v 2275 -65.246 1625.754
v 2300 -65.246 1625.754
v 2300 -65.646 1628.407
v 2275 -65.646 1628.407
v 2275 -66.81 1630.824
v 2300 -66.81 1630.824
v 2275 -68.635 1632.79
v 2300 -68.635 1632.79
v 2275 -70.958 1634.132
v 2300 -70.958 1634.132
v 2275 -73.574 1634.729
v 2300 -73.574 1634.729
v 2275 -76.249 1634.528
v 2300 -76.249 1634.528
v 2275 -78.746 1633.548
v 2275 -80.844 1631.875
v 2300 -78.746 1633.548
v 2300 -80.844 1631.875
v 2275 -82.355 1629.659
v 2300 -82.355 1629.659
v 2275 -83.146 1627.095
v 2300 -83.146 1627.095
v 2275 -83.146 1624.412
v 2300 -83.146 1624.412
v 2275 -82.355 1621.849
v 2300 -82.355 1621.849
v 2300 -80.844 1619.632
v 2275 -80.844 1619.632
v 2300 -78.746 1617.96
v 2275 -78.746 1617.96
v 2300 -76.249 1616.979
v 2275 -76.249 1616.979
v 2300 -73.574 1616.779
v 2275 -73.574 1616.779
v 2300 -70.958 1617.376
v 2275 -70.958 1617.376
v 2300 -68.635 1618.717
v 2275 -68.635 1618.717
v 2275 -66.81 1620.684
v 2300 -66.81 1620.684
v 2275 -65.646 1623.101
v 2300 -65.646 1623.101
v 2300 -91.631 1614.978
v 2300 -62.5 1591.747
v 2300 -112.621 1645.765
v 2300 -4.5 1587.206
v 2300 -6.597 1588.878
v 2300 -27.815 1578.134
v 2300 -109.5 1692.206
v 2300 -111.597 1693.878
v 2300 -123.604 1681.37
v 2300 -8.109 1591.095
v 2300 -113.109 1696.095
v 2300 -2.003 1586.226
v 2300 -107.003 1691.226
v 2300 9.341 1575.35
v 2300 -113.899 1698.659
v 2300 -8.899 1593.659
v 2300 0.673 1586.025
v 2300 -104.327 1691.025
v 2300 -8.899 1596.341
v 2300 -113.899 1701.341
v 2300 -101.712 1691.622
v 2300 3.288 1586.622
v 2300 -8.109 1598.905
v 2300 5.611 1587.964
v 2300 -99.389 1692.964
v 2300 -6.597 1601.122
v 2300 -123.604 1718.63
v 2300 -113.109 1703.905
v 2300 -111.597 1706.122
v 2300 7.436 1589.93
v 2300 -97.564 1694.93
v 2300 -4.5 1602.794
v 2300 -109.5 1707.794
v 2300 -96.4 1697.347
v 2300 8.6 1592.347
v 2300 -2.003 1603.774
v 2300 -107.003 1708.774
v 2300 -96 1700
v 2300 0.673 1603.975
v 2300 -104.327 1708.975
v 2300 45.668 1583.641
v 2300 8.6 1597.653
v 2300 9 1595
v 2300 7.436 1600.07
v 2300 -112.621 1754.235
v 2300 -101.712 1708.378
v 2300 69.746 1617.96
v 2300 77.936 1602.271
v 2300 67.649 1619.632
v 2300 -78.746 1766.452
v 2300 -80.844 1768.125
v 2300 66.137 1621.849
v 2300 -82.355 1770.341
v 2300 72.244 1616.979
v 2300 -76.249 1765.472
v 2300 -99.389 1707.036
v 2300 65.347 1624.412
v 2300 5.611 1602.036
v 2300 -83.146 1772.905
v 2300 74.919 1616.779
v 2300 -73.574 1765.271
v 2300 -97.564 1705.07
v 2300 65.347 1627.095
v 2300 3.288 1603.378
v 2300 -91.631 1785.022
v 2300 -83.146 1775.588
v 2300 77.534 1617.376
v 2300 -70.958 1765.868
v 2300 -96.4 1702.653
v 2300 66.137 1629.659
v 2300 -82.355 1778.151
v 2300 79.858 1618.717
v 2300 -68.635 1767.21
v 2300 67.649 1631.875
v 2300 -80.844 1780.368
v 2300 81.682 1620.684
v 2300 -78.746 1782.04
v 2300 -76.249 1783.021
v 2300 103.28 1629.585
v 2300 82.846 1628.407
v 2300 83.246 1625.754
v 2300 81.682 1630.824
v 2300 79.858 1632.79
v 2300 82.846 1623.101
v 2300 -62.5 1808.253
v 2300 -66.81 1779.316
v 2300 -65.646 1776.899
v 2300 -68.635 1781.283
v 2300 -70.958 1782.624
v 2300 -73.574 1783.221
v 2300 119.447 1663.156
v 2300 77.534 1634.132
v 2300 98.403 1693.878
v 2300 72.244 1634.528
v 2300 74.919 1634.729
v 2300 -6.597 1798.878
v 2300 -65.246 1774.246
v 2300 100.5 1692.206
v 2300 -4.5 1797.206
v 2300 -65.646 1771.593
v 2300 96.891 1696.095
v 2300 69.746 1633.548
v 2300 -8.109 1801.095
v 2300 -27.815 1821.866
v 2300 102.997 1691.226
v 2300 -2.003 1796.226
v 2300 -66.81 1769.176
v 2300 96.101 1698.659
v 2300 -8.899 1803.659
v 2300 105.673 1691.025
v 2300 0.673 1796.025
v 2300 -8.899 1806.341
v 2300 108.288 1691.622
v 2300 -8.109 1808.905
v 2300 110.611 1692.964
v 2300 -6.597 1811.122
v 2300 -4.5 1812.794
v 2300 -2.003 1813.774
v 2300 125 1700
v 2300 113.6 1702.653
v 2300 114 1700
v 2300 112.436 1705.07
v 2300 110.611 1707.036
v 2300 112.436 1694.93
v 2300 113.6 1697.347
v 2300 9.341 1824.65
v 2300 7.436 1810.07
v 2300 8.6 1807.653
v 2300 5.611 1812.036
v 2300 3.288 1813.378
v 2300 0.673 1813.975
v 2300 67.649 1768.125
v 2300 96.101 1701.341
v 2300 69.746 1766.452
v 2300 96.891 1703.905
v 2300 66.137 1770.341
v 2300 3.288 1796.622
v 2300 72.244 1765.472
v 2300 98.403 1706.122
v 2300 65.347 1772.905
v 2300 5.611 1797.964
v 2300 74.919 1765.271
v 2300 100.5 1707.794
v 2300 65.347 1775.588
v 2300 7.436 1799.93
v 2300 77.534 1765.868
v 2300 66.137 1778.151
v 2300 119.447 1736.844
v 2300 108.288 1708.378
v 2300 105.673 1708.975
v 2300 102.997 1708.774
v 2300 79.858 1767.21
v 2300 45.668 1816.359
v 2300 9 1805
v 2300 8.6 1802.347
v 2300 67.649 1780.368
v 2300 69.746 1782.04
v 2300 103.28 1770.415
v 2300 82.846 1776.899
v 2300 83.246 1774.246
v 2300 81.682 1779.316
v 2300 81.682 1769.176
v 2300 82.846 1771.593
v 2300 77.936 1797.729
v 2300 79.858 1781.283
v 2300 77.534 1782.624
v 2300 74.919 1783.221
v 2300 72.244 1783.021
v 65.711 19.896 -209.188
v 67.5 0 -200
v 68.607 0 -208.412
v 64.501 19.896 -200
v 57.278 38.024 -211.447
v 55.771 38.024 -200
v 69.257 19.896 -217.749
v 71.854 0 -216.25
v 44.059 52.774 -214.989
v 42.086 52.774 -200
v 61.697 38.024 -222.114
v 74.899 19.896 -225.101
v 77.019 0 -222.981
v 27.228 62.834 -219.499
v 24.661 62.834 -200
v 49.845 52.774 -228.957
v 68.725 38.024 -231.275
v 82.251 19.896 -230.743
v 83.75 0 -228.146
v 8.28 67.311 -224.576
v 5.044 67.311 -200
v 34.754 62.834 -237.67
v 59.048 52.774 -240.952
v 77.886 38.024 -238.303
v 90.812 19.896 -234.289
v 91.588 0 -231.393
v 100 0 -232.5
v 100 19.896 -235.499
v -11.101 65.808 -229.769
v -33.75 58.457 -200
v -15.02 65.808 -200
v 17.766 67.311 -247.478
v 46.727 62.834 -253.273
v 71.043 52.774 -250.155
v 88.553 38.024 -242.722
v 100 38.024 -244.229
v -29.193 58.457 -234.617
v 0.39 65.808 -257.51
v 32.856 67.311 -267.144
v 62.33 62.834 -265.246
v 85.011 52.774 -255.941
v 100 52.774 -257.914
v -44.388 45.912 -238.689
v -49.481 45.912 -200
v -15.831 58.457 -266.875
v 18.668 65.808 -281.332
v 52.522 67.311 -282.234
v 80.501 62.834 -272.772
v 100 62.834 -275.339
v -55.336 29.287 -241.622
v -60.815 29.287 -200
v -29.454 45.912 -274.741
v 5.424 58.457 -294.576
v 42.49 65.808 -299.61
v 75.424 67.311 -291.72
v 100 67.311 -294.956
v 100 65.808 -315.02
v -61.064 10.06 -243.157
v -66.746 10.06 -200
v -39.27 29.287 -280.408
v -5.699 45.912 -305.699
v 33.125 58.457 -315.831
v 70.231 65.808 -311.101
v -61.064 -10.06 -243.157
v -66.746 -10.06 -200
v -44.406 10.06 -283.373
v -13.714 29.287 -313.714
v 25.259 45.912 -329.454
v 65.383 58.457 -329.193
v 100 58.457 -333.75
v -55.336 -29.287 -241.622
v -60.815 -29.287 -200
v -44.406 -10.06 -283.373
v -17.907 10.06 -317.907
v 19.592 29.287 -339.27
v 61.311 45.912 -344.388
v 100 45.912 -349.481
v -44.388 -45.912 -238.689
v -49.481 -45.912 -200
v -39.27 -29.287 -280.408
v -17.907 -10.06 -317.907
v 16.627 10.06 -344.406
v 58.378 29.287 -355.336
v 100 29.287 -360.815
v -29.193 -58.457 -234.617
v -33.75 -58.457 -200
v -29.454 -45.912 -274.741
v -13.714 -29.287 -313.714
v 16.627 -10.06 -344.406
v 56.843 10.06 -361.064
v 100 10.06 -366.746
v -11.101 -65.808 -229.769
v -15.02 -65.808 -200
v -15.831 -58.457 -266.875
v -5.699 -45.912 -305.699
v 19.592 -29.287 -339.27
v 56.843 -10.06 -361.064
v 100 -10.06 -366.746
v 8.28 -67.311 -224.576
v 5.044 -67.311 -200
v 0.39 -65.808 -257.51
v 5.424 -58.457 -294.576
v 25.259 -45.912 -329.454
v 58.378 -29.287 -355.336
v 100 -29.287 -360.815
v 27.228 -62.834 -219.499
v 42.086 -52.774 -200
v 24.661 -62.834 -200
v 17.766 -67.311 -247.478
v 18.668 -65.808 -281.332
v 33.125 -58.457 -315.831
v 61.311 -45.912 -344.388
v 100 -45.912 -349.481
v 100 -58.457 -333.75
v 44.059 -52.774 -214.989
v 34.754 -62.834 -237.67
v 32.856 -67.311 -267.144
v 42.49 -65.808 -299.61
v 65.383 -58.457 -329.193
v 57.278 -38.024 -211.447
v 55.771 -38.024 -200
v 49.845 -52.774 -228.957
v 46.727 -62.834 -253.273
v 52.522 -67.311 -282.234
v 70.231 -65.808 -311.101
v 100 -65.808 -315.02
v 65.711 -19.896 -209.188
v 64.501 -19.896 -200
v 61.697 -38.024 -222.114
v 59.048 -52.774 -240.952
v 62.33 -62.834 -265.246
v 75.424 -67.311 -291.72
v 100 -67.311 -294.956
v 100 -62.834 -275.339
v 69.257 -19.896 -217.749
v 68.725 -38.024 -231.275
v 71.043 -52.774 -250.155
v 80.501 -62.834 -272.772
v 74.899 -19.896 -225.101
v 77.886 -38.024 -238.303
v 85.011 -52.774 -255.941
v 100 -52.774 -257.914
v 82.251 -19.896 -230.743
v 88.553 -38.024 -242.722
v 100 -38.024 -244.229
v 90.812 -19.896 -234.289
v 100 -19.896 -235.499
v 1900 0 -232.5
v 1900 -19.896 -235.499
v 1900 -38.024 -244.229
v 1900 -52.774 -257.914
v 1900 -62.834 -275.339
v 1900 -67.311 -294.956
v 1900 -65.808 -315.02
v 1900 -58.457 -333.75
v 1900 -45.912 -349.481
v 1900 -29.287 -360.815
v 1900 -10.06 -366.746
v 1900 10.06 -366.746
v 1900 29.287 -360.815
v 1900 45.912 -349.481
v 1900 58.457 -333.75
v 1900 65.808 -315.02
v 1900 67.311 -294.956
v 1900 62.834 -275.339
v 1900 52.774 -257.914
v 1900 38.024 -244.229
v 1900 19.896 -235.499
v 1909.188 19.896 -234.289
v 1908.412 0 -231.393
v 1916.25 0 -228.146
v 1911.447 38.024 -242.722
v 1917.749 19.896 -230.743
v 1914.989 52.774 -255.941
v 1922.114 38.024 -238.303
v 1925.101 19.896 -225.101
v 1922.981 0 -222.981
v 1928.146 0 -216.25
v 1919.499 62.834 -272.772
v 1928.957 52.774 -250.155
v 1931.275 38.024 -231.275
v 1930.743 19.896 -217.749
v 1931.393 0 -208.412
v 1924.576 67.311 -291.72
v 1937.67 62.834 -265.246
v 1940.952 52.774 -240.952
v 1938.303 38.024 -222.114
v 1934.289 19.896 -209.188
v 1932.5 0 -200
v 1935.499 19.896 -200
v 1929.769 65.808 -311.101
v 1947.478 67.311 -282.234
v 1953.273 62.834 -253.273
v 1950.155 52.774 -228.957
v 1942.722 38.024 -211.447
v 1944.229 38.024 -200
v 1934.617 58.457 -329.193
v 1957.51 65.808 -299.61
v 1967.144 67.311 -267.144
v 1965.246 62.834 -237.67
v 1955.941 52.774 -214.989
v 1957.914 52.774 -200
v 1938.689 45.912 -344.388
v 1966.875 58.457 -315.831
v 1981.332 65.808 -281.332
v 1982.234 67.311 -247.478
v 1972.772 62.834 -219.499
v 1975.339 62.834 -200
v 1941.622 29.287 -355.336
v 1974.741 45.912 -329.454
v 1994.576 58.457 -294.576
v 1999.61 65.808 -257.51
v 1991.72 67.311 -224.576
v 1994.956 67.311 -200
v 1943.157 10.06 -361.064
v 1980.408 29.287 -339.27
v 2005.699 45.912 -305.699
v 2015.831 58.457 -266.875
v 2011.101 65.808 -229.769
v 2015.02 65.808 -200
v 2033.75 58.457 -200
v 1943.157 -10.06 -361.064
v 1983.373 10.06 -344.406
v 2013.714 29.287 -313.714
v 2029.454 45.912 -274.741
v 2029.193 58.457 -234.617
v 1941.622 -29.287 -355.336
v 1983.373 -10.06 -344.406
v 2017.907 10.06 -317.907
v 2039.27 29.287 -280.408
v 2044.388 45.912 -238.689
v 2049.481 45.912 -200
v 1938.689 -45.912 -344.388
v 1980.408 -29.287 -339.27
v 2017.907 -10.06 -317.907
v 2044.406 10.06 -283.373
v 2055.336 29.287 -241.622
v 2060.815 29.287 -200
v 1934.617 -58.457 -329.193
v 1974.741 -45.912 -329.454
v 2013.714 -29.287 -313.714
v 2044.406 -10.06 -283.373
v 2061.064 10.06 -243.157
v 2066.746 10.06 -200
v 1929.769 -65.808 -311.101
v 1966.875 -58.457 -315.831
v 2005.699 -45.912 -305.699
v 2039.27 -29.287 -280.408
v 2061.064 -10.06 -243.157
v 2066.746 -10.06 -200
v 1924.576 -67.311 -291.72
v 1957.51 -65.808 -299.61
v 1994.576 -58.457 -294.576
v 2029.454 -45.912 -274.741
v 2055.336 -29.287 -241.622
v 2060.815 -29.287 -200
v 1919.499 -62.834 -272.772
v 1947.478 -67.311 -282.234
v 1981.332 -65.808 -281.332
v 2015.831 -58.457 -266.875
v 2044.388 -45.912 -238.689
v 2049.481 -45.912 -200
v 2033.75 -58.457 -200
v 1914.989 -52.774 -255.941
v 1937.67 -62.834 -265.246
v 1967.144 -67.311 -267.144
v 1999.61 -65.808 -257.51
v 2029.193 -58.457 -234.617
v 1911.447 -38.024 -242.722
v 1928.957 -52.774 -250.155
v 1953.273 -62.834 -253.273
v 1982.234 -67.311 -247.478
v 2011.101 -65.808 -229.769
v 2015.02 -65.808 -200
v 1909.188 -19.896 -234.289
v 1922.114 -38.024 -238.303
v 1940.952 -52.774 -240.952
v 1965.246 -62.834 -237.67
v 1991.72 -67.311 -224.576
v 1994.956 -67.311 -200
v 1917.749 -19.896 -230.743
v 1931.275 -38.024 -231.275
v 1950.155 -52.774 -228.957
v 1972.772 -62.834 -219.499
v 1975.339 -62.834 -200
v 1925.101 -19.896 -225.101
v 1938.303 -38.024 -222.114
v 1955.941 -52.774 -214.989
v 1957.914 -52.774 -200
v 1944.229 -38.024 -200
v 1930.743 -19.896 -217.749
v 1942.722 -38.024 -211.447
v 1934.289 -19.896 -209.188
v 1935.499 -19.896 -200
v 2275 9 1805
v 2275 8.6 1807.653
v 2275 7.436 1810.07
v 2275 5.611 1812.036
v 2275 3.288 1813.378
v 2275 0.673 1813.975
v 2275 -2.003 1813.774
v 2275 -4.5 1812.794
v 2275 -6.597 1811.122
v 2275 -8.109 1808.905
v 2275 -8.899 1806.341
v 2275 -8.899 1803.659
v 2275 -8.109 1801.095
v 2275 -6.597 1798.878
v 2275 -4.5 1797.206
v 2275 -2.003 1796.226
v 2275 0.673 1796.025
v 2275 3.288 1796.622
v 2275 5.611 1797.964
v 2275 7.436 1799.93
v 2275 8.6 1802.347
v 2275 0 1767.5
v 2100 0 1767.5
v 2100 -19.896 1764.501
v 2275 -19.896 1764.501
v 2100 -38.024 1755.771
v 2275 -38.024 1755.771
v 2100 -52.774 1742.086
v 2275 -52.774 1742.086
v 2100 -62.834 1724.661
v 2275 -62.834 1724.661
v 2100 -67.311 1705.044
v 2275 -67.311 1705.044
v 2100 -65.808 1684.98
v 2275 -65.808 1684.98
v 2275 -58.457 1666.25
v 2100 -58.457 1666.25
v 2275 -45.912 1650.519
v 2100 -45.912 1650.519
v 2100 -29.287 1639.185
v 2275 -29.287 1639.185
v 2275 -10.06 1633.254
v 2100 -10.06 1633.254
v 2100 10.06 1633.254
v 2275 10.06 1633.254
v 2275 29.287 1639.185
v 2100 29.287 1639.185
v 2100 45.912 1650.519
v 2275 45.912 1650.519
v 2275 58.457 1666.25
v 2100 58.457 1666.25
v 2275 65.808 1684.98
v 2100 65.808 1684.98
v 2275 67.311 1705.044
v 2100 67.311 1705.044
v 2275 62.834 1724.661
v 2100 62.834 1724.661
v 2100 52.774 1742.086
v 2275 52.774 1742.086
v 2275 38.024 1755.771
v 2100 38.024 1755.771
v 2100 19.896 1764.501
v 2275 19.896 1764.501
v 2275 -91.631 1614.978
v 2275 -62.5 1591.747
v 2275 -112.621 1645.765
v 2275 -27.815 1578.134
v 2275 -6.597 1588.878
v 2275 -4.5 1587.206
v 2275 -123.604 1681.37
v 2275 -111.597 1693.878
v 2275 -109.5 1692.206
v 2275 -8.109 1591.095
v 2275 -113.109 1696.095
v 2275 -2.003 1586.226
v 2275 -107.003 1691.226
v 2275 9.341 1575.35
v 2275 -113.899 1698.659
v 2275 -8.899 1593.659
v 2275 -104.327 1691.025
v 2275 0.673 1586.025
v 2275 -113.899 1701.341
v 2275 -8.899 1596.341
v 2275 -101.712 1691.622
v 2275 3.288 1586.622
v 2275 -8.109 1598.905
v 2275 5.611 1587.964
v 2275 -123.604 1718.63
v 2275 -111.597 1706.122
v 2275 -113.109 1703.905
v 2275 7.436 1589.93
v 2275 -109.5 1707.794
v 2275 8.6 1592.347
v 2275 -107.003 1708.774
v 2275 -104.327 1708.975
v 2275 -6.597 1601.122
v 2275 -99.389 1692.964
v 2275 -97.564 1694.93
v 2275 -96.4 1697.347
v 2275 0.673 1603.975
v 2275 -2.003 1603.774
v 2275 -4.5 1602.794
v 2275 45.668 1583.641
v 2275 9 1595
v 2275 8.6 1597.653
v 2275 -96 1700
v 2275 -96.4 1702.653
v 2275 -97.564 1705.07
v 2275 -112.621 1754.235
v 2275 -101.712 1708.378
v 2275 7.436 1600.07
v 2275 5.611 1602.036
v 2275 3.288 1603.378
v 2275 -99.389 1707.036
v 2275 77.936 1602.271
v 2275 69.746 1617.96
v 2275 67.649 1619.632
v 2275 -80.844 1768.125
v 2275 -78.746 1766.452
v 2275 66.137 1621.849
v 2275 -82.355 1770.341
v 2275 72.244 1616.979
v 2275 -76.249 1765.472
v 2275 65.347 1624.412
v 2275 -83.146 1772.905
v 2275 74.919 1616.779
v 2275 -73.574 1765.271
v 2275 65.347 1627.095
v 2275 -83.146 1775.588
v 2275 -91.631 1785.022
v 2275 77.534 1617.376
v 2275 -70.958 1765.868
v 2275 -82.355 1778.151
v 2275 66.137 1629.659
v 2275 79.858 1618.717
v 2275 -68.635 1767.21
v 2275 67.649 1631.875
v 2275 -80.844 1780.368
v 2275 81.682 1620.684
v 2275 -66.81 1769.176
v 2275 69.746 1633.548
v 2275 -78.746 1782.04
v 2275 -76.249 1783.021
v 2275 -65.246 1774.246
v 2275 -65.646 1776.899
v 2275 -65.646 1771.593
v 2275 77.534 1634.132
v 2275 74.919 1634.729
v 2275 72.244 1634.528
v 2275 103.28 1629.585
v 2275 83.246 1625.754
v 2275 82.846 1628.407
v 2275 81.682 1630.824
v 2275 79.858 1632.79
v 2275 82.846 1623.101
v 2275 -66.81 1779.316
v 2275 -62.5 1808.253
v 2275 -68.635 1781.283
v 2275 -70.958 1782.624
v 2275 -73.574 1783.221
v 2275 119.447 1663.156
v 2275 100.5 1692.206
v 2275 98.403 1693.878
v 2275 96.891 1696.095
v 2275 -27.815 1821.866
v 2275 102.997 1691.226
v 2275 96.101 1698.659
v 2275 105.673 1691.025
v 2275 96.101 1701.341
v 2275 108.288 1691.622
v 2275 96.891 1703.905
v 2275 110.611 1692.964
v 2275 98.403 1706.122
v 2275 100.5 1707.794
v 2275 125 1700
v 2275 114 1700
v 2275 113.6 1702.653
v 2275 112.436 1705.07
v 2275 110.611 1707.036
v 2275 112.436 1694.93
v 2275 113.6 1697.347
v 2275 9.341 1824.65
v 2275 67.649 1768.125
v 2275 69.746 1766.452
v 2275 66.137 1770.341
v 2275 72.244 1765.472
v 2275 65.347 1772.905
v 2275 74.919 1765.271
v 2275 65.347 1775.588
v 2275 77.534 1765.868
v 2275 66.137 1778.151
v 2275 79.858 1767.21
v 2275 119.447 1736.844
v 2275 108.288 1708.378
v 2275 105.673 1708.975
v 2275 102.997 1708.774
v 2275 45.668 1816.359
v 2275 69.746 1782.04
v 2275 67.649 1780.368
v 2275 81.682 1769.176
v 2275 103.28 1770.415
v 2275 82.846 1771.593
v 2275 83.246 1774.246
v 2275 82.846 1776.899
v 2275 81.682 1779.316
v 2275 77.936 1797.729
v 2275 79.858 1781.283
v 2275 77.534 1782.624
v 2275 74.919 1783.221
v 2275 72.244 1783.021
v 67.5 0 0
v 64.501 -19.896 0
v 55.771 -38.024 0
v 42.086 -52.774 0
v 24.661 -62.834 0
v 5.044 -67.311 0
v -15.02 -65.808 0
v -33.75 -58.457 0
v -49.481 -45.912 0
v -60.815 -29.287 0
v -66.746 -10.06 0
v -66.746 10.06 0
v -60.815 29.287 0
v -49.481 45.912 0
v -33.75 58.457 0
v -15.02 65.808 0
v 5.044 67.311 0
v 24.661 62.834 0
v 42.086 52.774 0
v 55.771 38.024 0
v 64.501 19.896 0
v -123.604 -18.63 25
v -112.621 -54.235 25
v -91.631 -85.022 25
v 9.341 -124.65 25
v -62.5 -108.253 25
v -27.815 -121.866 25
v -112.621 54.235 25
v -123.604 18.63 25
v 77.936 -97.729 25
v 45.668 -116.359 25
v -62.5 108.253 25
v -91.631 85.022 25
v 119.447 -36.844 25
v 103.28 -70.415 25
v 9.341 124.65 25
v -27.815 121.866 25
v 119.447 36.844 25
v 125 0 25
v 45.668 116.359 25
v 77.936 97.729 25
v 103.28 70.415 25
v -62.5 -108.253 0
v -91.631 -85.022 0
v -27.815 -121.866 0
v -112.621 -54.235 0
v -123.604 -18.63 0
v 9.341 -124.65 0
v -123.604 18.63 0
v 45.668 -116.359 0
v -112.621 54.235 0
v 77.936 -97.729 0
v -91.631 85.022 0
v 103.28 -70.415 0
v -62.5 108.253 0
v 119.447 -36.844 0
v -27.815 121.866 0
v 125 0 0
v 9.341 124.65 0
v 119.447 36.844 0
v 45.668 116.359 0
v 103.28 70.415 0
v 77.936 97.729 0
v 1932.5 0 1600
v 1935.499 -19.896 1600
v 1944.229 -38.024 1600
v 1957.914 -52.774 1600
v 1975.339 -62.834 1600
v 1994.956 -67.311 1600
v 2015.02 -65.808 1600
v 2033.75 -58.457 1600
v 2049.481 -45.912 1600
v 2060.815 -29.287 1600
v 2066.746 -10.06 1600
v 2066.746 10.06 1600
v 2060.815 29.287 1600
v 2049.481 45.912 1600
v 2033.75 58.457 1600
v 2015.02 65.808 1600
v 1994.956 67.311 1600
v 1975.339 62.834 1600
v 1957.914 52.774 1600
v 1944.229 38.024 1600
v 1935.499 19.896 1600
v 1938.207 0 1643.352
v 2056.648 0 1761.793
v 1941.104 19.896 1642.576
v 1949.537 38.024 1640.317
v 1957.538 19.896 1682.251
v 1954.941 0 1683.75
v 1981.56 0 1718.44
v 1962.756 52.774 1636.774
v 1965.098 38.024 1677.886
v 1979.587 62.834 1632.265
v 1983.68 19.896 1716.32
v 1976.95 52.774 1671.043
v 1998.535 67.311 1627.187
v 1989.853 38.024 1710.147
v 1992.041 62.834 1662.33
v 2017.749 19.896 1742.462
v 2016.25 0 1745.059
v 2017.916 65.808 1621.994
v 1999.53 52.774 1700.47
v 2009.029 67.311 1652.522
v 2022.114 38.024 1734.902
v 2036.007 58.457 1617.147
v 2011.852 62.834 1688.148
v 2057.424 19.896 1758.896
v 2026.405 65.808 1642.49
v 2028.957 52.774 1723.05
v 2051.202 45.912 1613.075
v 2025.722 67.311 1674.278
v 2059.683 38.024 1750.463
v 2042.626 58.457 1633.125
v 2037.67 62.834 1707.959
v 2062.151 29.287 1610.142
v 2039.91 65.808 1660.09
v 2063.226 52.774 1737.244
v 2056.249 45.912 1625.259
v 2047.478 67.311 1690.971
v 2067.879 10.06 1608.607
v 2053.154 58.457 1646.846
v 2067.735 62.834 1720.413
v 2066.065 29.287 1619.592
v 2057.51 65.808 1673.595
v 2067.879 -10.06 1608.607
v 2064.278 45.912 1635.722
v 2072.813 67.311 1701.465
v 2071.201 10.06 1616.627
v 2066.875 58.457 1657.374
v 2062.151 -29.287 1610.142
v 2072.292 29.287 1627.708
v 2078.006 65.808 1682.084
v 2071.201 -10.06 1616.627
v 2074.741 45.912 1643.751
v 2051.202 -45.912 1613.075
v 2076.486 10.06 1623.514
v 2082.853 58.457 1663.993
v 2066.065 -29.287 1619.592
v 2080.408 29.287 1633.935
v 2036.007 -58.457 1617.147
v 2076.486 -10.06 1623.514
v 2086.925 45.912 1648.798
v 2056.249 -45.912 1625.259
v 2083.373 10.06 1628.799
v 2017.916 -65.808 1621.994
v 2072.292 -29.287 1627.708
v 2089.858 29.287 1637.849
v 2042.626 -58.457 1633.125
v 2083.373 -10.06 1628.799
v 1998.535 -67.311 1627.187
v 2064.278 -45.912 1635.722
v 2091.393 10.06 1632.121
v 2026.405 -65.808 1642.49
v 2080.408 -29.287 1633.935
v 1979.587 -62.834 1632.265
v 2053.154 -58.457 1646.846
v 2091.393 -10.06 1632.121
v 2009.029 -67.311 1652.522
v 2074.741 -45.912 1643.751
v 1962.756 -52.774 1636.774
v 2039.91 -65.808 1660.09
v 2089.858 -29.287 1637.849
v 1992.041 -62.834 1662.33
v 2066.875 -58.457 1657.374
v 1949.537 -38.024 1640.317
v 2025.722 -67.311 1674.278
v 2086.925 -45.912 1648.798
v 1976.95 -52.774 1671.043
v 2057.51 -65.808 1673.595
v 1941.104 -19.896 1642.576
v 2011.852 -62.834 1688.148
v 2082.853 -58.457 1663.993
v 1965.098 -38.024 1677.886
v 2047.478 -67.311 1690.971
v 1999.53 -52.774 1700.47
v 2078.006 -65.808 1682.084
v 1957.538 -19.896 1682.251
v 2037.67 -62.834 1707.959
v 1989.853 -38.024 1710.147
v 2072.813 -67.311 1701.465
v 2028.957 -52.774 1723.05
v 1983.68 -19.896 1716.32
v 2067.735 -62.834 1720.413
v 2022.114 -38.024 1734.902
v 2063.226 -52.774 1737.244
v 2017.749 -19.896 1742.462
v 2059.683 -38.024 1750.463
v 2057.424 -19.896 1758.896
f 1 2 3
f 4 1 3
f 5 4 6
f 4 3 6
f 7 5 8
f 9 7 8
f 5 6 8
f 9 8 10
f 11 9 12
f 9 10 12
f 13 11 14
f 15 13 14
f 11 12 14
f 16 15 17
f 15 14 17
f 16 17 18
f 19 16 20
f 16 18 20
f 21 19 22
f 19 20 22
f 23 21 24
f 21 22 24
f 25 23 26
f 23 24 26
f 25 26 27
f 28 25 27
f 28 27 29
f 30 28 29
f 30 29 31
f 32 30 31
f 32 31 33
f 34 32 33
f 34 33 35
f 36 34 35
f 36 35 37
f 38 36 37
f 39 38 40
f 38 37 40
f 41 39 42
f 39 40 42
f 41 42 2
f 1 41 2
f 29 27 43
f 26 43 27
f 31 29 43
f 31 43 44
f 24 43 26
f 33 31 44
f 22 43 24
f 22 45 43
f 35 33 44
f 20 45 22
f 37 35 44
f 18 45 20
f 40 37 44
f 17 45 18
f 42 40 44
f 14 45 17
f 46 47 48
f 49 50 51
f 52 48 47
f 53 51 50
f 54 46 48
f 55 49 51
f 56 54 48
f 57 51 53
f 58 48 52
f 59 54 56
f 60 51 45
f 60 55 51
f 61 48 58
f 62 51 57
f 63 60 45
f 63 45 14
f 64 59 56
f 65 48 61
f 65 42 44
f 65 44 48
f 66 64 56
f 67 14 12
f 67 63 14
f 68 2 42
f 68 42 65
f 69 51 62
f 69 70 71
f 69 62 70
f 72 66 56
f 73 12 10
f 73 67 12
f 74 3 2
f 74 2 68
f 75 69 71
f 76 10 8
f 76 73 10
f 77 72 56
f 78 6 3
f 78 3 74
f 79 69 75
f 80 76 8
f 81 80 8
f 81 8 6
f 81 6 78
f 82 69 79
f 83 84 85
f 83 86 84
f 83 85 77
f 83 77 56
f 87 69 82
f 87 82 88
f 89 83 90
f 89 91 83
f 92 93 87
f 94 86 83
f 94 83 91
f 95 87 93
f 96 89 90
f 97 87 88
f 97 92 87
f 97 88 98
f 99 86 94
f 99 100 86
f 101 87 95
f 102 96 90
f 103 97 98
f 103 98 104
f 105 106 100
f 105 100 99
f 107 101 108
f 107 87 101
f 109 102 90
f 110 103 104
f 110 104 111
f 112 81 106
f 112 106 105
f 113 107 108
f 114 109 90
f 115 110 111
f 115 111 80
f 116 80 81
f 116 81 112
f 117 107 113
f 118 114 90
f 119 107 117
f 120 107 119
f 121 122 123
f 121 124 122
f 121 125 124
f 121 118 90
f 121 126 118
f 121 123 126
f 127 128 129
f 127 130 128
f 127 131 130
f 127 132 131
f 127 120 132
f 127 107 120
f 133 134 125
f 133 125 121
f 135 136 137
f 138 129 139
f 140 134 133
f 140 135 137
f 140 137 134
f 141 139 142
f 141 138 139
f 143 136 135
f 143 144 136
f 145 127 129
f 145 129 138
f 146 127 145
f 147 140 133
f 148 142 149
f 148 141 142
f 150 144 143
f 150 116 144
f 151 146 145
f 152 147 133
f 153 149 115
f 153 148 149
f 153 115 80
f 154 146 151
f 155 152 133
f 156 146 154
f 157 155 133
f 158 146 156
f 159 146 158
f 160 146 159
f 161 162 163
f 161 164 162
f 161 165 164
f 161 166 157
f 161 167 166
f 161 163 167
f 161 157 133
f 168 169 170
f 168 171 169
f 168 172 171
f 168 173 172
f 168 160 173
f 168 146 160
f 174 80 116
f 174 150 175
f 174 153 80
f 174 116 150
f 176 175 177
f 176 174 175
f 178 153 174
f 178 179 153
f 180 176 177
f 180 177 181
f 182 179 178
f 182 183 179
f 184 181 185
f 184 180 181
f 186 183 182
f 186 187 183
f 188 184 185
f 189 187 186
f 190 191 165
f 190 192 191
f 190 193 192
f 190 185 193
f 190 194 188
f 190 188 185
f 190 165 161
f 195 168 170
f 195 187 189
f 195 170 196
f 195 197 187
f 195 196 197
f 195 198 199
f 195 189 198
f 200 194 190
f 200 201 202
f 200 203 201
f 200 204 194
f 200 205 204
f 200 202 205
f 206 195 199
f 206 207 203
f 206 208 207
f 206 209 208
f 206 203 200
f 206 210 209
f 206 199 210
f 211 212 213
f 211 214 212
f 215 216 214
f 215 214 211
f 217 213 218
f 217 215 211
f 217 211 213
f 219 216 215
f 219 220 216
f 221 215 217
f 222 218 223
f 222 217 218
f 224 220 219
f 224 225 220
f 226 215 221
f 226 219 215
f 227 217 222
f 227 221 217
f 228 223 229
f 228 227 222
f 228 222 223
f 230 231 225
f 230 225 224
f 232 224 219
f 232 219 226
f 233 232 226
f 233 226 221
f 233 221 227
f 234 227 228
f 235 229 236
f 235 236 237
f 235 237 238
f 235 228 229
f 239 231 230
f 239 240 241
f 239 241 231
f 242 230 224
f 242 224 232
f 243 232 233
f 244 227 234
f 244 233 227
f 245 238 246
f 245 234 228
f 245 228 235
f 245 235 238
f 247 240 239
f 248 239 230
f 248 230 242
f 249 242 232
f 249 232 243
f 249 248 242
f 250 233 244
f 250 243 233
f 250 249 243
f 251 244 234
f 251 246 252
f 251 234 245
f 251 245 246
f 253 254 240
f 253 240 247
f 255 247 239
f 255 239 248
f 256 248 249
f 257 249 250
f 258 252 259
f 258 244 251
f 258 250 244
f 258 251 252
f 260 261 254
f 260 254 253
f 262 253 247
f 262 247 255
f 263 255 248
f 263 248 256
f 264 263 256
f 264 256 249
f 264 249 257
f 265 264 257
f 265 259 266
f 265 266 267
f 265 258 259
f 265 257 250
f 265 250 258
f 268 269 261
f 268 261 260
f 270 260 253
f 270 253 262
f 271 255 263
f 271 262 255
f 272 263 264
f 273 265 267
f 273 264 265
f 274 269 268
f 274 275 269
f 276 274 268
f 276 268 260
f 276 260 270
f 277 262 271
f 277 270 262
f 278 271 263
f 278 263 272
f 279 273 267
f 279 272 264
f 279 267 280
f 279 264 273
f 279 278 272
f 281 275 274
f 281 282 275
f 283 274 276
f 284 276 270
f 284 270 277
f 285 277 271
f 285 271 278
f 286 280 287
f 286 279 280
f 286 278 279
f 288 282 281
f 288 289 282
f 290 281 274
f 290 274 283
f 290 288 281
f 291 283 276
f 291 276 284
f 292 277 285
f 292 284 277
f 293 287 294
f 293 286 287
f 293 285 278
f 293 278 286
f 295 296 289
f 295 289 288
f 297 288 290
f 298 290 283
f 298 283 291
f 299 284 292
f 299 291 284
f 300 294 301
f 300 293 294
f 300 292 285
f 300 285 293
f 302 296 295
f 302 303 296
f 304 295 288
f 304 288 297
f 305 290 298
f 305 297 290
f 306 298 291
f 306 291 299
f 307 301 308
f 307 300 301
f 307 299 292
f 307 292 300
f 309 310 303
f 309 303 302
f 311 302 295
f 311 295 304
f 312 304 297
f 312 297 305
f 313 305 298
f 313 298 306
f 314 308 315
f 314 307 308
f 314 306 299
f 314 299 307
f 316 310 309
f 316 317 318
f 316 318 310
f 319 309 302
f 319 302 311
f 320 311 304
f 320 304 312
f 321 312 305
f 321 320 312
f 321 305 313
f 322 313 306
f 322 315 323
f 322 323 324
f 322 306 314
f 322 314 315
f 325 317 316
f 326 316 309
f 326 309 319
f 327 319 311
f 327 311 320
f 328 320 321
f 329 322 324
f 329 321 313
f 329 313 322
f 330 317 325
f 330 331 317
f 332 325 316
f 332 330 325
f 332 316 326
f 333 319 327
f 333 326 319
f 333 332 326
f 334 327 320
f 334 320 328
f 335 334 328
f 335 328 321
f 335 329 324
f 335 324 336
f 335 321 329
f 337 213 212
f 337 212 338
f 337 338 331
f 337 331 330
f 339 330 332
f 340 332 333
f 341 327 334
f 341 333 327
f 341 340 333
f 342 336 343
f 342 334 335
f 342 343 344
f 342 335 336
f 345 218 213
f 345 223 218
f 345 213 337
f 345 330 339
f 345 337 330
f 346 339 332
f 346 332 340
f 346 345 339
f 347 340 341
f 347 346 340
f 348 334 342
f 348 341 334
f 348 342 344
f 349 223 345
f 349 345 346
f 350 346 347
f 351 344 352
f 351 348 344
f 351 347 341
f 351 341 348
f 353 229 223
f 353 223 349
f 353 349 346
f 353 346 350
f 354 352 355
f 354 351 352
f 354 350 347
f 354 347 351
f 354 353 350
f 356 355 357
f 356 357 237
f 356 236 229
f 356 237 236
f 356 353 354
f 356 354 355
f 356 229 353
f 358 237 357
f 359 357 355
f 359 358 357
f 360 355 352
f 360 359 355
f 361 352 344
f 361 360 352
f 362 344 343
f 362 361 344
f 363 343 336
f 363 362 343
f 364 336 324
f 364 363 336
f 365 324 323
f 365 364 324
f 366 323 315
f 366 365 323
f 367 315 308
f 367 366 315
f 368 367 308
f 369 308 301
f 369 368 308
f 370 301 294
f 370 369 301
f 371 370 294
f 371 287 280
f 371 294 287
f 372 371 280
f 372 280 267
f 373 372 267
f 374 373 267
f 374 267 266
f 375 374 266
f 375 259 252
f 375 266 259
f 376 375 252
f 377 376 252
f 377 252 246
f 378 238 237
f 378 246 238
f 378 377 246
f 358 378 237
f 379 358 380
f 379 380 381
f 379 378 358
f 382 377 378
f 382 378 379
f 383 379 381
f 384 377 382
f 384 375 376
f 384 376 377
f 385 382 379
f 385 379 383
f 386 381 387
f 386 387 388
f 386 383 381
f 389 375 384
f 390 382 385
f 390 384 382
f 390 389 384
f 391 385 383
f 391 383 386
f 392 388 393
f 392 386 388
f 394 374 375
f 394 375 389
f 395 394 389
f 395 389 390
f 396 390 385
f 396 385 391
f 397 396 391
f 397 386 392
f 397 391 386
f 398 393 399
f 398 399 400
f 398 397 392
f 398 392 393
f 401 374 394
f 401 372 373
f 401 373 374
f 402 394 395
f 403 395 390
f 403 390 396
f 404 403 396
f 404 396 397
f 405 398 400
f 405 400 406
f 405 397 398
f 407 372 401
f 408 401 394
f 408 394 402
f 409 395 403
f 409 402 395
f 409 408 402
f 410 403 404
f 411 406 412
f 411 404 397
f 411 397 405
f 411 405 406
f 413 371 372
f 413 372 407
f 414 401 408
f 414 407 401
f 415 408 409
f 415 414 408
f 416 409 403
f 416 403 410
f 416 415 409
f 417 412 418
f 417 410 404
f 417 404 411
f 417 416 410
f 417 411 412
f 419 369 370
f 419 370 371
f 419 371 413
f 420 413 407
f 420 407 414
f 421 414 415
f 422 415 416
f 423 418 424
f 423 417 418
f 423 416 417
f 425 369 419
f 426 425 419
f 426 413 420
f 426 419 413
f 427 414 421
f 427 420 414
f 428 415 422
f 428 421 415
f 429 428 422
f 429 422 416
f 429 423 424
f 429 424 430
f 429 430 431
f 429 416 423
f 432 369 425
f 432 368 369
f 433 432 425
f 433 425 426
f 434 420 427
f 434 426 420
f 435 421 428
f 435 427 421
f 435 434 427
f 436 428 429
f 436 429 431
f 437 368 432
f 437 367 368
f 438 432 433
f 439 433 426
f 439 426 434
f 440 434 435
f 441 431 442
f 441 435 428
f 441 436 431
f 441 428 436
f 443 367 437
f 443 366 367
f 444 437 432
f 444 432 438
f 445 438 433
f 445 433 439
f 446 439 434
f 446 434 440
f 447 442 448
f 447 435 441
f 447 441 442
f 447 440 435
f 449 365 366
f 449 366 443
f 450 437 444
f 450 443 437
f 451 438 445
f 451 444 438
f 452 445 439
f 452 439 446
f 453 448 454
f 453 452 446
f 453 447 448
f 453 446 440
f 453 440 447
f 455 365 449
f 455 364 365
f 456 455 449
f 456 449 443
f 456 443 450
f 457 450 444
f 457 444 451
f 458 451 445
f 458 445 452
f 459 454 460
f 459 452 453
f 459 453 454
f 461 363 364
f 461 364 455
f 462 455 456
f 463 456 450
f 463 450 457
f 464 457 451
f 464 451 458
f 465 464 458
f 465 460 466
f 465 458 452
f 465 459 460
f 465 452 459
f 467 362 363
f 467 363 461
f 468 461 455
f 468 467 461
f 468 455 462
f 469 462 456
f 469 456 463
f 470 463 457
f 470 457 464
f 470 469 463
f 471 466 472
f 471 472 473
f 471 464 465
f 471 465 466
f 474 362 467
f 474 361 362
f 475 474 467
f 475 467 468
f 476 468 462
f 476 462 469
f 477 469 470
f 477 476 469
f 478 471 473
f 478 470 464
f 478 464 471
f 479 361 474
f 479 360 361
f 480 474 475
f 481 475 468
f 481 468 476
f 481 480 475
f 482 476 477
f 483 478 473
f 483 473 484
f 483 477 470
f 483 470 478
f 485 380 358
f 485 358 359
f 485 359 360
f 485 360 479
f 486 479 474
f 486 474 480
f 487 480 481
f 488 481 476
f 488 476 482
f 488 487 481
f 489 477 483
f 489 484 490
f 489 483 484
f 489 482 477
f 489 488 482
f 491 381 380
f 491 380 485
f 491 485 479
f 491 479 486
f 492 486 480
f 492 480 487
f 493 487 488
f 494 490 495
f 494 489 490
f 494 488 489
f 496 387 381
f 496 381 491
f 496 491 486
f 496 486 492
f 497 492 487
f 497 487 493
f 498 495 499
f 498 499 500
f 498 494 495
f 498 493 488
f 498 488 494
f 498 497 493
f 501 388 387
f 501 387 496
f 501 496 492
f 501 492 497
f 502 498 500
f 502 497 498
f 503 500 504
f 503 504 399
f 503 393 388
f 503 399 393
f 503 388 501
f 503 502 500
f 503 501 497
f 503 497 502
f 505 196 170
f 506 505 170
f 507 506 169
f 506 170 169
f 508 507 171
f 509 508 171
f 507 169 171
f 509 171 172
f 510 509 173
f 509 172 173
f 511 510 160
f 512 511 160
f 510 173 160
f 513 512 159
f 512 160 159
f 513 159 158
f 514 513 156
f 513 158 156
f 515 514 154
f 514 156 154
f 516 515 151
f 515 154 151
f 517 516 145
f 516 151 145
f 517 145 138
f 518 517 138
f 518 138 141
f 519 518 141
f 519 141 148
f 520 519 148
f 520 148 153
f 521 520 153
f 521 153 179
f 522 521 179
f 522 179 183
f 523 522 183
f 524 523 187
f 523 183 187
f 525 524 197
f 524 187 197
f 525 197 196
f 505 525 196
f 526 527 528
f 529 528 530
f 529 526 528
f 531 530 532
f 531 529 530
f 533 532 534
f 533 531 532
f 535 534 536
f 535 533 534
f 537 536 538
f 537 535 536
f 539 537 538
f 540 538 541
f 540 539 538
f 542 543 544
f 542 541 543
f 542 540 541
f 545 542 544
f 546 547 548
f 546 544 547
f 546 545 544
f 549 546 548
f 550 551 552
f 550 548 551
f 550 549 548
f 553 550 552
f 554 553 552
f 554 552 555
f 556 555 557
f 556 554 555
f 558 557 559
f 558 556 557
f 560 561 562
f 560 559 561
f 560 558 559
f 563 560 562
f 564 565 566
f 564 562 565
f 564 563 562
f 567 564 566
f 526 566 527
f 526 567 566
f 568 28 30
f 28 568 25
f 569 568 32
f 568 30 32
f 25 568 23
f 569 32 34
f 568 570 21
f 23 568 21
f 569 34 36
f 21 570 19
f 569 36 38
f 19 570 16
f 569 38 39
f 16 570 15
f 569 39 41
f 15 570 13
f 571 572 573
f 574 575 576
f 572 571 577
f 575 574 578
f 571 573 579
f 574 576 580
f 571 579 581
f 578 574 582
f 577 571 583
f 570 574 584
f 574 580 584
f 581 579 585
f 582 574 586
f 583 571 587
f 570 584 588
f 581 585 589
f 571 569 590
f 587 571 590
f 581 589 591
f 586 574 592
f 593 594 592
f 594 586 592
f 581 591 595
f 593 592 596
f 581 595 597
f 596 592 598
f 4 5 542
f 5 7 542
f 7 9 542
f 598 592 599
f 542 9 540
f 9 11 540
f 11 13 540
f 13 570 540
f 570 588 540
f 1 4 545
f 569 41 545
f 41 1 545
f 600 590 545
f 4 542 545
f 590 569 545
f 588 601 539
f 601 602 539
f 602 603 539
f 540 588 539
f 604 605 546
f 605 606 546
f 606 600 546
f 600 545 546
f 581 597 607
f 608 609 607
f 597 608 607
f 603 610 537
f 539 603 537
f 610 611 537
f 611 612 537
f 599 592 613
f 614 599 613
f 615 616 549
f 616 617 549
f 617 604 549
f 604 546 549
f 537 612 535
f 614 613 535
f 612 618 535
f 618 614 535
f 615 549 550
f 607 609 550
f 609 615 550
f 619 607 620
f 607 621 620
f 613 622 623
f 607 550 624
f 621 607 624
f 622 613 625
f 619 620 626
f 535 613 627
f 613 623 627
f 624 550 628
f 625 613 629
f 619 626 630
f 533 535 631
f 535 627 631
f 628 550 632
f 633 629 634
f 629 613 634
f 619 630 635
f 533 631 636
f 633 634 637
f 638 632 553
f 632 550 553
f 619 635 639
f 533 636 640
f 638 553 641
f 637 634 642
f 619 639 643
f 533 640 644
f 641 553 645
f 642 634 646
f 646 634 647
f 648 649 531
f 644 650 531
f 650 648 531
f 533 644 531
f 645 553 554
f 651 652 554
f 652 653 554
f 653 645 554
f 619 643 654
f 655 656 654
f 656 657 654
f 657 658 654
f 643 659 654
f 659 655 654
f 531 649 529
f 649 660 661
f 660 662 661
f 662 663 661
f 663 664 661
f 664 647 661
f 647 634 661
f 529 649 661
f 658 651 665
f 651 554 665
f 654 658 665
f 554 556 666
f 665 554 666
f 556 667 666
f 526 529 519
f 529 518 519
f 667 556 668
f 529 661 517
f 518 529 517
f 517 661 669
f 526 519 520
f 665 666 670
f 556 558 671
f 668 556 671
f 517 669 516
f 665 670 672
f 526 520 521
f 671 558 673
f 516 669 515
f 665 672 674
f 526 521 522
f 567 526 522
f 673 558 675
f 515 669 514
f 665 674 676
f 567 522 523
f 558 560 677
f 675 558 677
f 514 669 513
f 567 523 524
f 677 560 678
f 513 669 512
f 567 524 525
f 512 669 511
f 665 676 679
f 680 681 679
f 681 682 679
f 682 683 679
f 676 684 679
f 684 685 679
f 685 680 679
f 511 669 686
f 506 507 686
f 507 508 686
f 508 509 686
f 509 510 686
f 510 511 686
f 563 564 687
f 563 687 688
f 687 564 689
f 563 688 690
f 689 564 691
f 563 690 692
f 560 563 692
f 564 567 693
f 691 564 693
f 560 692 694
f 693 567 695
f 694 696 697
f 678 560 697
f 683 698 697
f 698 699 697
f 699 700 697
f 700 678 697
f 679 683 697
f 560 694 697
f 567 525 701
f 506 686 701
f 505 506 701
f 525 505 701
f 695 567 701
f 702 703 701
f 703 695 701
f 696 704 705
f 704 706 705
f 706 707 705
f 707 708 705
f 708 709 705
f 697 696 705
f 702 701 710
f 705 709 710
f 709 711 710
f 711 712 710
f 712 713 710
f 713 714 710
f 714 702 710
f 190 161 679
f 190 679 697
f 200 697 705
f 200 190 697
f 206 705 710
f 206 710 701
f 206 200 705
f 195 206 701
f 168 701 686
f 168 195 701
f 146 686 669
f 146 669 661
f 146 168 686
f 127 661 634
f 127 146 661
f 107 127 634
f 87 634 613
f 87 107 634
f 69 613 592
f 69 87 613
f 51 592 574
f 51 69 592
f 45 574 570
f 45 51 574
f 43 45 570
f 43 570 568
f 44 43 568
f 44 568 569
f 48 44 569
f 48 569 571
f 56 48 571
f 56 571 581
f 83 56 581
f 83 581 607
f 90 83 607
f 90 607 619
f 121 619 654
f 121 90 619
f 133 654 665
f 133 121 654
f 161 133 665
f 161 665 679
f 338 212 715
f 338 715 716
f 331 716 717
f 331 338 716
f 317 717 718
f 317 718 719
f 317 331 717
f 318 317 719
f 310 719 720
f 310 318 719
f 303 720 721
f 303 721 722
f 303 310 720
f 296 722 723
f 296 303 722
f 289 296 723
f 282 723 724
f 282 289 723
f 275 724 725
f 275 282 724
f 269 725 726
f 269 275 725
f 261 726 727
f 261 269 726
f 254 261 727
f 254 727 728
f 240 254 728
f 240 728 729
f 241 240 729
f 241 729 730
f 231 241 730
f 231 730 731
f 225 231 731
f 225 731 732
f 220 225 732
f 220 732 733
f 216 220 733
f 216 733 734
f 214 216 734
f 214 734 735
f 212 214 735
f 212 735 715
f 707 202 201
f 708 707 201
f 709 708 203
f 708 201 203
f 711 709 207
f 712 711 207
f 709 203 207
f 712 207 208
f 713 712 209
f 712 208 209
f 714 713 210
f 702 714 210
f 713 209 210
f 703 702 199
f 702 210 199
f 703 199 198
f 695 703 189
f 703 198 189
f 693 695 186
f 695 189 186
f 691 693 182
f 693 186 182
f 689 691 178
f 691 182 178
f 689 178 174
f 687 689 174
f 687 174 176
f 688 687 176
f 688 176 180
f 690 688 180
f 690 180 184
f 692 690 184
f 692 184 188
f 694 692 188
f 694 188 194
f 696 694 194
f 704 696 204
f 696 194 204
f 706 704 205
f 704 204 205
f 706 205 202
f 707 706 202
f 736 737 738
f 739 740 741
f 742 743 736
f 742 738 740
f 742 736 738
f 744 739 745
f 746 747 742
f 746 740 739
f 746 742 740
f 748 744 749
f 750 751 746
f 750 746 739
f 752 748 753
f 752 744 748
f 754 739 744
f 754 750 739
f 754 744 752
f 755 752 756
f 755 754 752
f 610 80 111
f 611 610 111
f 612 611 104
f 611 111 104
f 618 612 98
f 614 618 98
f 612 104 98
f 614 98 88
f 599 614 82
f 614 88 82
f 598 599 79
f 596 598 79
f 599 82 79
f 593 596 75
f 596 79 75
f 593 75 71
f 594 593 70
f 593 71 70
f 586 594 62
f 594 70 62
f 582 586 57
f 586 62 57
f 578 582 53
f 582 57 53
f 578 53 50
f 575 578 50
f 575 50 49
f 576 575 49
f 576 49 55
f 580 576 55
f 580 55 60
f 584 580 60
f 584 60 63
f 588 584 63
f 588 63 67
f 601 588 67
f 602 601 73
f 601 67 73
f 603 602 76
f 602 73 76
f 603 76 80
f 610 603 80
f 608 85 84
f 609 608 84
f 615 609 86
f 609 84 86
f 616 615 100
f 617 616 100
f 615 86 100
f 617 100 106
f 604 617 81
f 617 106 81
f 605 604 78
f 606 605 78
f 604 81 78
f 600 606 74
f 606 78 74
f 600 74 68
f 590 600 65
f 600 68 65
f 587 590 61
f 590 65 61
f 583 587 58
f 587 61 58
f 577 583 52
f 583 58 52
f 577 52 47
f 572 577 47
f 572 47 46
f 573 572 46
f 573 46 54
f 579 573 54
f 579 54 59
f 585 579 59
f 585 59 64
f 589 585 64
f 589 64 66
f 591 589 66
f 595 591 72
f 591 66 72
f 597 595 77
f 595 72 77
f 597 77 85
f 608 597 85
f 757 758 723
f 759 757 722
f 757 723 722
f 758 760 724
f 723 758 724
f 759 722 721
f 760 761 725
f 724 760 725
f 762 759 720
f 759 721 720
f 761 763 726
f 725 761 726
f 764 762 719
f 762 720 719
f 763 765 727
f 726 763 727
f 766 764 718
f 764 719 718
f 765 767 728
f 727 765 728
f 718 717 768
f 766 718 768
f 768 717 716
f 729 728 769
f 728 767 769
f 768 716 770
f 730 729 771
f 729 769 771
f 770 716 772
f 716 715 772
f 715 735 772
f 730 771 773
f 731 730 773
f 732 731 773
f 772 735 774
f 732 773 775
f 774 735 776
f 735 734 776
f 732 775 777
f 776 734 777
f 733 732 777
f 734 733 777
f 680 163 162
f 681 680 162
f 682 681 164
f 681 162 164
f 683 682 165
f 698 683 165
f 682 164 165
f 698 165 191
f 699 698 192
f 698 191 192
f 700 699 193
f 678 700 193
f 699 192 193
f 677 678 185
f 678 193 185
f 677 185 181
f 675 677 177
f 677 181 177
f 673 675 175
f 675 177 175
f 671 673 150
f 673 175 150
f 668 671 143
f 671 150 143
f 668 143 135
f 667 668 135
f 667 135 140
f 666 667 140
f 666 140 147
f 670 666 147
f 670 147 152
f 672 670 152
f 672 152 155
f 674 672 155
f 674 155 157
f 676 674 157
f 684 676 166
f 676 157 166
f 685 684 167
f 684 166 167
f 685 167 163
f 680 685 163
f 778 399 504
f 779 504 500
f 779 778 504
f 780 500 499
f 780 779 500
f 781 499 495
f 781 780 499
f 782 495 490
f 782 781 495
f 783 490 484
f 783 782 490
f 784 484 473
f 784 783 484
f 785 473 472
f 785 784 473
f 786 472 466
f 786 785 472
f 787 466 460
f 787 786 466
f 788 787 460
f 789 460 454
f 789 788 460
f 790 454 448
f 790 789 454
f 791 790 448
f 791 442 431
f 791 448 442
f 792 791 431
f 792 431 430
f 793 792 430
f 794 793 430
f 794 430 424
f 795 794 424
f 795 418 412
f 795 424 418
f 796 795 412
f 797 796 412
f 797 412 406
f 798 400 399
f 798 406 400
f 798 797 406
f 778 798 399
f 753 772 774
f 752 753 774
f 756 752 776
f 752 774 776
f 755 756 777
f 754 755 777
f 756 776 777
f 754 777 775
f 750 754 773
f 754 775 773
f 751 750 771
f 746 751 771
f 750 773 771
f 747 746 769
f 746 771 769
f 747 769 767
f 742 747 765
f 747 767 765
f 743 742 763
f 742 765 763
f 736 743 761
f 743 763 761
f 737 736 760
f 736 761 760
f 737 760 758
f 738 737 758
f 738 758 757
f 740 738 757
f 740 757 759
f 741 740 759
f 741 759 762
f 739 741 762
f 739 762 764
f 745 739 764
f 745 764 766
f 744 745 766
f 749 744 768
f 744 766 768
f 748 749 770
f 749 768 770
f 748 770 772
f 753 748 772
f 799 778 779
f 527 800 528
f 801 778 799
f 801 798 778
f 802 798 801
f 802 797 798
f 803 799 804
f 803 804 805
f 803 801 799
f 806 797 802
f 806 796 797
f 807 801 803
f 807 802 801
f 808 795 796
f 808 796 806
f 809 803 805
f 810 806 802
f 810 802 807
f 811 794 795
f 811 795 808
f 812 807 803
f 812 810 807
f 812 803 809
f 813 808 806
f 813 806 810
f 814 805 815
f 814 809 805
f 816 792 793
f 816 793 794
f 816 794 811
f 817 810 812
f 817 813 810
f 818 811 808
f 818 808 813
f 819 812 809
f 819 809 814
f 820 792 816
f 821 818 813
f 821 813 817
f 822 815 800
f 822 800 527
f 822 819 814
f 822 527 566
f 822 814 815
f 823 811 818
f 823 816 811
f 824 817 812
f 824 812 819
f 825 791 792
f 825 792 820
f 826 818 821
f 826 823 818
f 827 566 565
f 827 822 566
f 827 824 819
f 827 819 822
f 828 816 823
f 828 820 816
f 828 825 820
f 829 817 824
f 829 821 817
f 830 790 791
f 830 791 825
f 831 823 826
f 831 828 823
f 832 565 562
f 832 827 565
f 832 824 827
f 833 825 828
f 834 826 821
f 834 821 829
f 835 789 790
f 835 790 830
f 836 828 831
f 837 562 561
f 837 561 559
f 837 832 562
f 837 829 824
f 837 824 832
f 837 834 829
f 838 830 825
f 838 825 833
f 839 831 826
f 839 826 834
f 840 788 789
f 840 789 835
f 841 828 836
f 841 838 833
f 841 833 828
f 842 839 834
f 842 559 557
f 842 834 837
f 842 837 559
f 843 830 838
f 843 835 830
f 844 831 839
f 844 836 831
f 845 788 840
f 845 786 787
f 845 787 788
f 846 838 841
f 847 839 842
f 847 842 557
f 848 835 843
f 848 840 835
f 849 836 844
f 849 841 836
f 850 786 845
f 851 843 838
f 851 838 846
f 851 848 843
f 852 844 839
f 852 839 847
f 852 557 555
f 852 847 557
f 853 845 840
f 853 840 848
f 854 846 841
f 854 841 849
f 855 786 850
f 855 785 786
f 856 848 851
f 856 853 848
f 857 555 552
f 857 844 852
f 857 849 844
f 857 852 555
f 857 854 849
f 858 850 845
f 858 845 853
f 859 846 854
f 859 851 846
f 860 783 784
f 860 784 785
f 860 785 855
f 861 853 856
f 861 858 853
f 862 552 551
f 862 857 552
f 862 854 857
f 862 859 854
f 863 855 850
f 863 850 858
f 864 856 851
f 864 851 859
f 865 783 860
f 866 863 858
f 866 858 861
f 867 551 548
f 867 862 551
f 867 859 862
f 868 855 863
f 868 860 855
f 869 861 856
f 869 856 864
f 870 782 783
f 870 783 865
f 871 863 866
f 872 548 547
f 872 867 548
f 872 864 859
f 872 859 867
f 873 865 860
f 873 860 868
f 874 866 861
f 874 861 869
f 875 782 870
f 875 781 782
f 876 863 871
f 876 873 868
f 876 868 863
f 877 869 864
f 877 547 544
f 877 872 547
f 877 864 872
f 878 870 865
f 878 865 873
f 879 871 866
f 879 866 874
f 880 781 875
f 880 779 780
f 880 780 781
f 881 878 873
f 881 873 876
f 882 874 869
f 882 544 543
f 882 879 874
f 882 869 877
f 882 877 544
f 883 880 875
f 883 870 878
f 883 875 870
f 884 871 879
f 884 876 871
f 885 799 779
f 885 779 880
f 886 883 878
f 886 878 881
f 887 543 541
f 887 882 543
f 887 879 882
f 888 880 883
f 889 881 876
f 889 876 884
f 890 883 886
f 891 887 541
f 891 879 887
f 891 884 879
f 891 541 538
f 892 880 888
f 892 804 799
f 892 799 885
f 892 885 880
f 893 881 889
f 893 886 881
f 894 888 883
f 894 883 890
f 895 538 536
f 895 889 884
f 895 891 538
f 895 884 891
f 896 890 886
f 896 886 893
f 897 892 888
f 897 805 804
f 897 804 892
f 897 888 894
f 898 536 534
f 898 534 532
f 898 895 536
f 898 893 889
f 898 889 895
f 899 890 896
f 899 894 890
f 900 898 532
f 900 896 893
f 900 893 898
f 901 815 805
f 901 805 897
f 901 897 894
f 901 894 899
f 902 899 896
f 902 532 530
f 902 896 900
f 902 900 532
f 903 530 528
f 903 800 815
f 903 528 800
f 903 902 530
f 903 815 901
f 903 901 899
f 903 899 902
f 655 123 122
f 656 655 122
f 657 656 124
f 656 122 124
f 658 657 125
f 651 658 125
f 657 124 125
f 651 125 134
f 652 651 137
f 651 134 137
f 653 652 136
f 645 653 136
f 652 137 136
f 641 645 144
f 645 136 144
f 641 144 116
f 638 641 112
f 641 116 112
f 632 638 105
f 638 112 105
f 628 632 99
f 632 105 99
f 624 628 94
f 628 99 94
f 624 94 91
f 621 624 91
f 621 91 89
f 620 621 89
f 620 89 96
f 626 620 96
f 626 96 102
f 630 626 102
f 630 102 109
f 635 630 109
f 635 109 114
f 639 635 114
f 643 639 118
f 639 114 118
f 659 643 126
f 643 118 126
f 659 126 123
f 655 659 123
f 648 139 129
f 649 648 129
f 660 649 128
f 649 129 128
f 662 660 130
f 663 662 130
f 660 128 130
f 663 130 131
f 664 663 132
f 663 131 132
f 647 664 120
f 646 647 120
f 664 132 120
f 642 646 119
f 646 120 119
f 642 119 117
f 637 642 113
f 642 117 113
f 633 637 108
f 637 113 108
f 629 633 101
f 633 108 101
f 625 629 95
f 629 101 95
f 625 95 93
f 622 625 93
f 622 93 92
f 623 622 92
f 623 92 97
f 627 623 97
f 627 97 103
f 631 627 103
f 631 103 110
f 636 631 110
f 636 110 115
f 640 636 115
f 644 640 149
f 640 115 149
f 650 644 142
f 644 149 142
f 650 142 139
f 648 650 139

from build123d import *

# Parameters (mm, degrees)
F1_R      = 67.5
F1_R_2    = 125
F2_FACE_R = 67.5
F3_DEPTH  = 25
F4_R      = 125
F4_R_2    = 9
F4_R_3    = 67.5
F5_DEPTH  = 25


with BuildPart() as f2:
    # F2: sweep along a path in F0
    with BuildLine(Plane.XZ) as f2_path:
        Line((0, 0), (0, -200))
        ThreePointArc((0, -200), (29.2893218813, -270.7106781187), (100, -300))
        Line((100, -300), (1900, -300))
        ThreePointArc((1900, -300), (1970.7106781187, -270.7106781187), (2000, -200))
        Line((2000, -200), (2000, 1600))
        ThreePointArc((2000, 1600), (2029.2893218813, 1670.7106781187), (2100, 1700))
        Line((2100, 1700), (2300, 1700))
    # F1 (on Top) → F2 (sweep)
    with BuildSketch(Plane.XY):
        Circle(F1_R)
    sweep(path=f2_path.line)

    # F1 (on Top) + F2_face (on face) → F3 (join)
    with BuildSketch(Plane.XY):
        Circle(F1_R_2)
        Circle(F1_R, mode=Mode.SUBTRACT)
    with BuildSketch(Plane.XY):
        Circle(F2_FACE_R)
    extrude(amount=F3_DEPTH)

    # F4 (on face) → F5 (join)
    with BuildSketch(Plane.YZ.offset(2300)):
        with Locations((0, 1700)):
            Circle(F4_R)
        with Locations((-74.2462120246, 1625.7537879754)):
            Circle(F4_R_2, mode=Mode.SUBTRACT)
        with Locations((0, 1595)):
            Circle(F4_R_2, mode=Mode.SUBTRACT)
        with Locations((74.2462120246, 1625.7537879754)):
            Circle(F4_R_2, mode=Mode.SUBTRACT)
        with Locations((-105, 1700)):
            Circle(F4_R_2, mode=Mode.SUBTRACT)
        with Locations((-74.2462120246, 1774.2462120246)):
            Circle(F4_R_2, mode=Mode.SUBTRACT)
        with Locations((0, 1700)):
            Circle(F4_R_3, mode=Mode.SUBTRACT)
        with Locations((105, 1700)):
            Circle(F4_R_2, mode=Mode.SUBTRACT)
        with Locations((0, 1805)):
            Circle(F4_R_2, mode=Mode.SUBTRACT)
        with Locations((74.2462120246, 1774.2462120246)):
            Circle(F4_R_2, mode=Mode.SUBTRACT)
    extrude(amount=-F5_DEPTH)


solid = f2.part
